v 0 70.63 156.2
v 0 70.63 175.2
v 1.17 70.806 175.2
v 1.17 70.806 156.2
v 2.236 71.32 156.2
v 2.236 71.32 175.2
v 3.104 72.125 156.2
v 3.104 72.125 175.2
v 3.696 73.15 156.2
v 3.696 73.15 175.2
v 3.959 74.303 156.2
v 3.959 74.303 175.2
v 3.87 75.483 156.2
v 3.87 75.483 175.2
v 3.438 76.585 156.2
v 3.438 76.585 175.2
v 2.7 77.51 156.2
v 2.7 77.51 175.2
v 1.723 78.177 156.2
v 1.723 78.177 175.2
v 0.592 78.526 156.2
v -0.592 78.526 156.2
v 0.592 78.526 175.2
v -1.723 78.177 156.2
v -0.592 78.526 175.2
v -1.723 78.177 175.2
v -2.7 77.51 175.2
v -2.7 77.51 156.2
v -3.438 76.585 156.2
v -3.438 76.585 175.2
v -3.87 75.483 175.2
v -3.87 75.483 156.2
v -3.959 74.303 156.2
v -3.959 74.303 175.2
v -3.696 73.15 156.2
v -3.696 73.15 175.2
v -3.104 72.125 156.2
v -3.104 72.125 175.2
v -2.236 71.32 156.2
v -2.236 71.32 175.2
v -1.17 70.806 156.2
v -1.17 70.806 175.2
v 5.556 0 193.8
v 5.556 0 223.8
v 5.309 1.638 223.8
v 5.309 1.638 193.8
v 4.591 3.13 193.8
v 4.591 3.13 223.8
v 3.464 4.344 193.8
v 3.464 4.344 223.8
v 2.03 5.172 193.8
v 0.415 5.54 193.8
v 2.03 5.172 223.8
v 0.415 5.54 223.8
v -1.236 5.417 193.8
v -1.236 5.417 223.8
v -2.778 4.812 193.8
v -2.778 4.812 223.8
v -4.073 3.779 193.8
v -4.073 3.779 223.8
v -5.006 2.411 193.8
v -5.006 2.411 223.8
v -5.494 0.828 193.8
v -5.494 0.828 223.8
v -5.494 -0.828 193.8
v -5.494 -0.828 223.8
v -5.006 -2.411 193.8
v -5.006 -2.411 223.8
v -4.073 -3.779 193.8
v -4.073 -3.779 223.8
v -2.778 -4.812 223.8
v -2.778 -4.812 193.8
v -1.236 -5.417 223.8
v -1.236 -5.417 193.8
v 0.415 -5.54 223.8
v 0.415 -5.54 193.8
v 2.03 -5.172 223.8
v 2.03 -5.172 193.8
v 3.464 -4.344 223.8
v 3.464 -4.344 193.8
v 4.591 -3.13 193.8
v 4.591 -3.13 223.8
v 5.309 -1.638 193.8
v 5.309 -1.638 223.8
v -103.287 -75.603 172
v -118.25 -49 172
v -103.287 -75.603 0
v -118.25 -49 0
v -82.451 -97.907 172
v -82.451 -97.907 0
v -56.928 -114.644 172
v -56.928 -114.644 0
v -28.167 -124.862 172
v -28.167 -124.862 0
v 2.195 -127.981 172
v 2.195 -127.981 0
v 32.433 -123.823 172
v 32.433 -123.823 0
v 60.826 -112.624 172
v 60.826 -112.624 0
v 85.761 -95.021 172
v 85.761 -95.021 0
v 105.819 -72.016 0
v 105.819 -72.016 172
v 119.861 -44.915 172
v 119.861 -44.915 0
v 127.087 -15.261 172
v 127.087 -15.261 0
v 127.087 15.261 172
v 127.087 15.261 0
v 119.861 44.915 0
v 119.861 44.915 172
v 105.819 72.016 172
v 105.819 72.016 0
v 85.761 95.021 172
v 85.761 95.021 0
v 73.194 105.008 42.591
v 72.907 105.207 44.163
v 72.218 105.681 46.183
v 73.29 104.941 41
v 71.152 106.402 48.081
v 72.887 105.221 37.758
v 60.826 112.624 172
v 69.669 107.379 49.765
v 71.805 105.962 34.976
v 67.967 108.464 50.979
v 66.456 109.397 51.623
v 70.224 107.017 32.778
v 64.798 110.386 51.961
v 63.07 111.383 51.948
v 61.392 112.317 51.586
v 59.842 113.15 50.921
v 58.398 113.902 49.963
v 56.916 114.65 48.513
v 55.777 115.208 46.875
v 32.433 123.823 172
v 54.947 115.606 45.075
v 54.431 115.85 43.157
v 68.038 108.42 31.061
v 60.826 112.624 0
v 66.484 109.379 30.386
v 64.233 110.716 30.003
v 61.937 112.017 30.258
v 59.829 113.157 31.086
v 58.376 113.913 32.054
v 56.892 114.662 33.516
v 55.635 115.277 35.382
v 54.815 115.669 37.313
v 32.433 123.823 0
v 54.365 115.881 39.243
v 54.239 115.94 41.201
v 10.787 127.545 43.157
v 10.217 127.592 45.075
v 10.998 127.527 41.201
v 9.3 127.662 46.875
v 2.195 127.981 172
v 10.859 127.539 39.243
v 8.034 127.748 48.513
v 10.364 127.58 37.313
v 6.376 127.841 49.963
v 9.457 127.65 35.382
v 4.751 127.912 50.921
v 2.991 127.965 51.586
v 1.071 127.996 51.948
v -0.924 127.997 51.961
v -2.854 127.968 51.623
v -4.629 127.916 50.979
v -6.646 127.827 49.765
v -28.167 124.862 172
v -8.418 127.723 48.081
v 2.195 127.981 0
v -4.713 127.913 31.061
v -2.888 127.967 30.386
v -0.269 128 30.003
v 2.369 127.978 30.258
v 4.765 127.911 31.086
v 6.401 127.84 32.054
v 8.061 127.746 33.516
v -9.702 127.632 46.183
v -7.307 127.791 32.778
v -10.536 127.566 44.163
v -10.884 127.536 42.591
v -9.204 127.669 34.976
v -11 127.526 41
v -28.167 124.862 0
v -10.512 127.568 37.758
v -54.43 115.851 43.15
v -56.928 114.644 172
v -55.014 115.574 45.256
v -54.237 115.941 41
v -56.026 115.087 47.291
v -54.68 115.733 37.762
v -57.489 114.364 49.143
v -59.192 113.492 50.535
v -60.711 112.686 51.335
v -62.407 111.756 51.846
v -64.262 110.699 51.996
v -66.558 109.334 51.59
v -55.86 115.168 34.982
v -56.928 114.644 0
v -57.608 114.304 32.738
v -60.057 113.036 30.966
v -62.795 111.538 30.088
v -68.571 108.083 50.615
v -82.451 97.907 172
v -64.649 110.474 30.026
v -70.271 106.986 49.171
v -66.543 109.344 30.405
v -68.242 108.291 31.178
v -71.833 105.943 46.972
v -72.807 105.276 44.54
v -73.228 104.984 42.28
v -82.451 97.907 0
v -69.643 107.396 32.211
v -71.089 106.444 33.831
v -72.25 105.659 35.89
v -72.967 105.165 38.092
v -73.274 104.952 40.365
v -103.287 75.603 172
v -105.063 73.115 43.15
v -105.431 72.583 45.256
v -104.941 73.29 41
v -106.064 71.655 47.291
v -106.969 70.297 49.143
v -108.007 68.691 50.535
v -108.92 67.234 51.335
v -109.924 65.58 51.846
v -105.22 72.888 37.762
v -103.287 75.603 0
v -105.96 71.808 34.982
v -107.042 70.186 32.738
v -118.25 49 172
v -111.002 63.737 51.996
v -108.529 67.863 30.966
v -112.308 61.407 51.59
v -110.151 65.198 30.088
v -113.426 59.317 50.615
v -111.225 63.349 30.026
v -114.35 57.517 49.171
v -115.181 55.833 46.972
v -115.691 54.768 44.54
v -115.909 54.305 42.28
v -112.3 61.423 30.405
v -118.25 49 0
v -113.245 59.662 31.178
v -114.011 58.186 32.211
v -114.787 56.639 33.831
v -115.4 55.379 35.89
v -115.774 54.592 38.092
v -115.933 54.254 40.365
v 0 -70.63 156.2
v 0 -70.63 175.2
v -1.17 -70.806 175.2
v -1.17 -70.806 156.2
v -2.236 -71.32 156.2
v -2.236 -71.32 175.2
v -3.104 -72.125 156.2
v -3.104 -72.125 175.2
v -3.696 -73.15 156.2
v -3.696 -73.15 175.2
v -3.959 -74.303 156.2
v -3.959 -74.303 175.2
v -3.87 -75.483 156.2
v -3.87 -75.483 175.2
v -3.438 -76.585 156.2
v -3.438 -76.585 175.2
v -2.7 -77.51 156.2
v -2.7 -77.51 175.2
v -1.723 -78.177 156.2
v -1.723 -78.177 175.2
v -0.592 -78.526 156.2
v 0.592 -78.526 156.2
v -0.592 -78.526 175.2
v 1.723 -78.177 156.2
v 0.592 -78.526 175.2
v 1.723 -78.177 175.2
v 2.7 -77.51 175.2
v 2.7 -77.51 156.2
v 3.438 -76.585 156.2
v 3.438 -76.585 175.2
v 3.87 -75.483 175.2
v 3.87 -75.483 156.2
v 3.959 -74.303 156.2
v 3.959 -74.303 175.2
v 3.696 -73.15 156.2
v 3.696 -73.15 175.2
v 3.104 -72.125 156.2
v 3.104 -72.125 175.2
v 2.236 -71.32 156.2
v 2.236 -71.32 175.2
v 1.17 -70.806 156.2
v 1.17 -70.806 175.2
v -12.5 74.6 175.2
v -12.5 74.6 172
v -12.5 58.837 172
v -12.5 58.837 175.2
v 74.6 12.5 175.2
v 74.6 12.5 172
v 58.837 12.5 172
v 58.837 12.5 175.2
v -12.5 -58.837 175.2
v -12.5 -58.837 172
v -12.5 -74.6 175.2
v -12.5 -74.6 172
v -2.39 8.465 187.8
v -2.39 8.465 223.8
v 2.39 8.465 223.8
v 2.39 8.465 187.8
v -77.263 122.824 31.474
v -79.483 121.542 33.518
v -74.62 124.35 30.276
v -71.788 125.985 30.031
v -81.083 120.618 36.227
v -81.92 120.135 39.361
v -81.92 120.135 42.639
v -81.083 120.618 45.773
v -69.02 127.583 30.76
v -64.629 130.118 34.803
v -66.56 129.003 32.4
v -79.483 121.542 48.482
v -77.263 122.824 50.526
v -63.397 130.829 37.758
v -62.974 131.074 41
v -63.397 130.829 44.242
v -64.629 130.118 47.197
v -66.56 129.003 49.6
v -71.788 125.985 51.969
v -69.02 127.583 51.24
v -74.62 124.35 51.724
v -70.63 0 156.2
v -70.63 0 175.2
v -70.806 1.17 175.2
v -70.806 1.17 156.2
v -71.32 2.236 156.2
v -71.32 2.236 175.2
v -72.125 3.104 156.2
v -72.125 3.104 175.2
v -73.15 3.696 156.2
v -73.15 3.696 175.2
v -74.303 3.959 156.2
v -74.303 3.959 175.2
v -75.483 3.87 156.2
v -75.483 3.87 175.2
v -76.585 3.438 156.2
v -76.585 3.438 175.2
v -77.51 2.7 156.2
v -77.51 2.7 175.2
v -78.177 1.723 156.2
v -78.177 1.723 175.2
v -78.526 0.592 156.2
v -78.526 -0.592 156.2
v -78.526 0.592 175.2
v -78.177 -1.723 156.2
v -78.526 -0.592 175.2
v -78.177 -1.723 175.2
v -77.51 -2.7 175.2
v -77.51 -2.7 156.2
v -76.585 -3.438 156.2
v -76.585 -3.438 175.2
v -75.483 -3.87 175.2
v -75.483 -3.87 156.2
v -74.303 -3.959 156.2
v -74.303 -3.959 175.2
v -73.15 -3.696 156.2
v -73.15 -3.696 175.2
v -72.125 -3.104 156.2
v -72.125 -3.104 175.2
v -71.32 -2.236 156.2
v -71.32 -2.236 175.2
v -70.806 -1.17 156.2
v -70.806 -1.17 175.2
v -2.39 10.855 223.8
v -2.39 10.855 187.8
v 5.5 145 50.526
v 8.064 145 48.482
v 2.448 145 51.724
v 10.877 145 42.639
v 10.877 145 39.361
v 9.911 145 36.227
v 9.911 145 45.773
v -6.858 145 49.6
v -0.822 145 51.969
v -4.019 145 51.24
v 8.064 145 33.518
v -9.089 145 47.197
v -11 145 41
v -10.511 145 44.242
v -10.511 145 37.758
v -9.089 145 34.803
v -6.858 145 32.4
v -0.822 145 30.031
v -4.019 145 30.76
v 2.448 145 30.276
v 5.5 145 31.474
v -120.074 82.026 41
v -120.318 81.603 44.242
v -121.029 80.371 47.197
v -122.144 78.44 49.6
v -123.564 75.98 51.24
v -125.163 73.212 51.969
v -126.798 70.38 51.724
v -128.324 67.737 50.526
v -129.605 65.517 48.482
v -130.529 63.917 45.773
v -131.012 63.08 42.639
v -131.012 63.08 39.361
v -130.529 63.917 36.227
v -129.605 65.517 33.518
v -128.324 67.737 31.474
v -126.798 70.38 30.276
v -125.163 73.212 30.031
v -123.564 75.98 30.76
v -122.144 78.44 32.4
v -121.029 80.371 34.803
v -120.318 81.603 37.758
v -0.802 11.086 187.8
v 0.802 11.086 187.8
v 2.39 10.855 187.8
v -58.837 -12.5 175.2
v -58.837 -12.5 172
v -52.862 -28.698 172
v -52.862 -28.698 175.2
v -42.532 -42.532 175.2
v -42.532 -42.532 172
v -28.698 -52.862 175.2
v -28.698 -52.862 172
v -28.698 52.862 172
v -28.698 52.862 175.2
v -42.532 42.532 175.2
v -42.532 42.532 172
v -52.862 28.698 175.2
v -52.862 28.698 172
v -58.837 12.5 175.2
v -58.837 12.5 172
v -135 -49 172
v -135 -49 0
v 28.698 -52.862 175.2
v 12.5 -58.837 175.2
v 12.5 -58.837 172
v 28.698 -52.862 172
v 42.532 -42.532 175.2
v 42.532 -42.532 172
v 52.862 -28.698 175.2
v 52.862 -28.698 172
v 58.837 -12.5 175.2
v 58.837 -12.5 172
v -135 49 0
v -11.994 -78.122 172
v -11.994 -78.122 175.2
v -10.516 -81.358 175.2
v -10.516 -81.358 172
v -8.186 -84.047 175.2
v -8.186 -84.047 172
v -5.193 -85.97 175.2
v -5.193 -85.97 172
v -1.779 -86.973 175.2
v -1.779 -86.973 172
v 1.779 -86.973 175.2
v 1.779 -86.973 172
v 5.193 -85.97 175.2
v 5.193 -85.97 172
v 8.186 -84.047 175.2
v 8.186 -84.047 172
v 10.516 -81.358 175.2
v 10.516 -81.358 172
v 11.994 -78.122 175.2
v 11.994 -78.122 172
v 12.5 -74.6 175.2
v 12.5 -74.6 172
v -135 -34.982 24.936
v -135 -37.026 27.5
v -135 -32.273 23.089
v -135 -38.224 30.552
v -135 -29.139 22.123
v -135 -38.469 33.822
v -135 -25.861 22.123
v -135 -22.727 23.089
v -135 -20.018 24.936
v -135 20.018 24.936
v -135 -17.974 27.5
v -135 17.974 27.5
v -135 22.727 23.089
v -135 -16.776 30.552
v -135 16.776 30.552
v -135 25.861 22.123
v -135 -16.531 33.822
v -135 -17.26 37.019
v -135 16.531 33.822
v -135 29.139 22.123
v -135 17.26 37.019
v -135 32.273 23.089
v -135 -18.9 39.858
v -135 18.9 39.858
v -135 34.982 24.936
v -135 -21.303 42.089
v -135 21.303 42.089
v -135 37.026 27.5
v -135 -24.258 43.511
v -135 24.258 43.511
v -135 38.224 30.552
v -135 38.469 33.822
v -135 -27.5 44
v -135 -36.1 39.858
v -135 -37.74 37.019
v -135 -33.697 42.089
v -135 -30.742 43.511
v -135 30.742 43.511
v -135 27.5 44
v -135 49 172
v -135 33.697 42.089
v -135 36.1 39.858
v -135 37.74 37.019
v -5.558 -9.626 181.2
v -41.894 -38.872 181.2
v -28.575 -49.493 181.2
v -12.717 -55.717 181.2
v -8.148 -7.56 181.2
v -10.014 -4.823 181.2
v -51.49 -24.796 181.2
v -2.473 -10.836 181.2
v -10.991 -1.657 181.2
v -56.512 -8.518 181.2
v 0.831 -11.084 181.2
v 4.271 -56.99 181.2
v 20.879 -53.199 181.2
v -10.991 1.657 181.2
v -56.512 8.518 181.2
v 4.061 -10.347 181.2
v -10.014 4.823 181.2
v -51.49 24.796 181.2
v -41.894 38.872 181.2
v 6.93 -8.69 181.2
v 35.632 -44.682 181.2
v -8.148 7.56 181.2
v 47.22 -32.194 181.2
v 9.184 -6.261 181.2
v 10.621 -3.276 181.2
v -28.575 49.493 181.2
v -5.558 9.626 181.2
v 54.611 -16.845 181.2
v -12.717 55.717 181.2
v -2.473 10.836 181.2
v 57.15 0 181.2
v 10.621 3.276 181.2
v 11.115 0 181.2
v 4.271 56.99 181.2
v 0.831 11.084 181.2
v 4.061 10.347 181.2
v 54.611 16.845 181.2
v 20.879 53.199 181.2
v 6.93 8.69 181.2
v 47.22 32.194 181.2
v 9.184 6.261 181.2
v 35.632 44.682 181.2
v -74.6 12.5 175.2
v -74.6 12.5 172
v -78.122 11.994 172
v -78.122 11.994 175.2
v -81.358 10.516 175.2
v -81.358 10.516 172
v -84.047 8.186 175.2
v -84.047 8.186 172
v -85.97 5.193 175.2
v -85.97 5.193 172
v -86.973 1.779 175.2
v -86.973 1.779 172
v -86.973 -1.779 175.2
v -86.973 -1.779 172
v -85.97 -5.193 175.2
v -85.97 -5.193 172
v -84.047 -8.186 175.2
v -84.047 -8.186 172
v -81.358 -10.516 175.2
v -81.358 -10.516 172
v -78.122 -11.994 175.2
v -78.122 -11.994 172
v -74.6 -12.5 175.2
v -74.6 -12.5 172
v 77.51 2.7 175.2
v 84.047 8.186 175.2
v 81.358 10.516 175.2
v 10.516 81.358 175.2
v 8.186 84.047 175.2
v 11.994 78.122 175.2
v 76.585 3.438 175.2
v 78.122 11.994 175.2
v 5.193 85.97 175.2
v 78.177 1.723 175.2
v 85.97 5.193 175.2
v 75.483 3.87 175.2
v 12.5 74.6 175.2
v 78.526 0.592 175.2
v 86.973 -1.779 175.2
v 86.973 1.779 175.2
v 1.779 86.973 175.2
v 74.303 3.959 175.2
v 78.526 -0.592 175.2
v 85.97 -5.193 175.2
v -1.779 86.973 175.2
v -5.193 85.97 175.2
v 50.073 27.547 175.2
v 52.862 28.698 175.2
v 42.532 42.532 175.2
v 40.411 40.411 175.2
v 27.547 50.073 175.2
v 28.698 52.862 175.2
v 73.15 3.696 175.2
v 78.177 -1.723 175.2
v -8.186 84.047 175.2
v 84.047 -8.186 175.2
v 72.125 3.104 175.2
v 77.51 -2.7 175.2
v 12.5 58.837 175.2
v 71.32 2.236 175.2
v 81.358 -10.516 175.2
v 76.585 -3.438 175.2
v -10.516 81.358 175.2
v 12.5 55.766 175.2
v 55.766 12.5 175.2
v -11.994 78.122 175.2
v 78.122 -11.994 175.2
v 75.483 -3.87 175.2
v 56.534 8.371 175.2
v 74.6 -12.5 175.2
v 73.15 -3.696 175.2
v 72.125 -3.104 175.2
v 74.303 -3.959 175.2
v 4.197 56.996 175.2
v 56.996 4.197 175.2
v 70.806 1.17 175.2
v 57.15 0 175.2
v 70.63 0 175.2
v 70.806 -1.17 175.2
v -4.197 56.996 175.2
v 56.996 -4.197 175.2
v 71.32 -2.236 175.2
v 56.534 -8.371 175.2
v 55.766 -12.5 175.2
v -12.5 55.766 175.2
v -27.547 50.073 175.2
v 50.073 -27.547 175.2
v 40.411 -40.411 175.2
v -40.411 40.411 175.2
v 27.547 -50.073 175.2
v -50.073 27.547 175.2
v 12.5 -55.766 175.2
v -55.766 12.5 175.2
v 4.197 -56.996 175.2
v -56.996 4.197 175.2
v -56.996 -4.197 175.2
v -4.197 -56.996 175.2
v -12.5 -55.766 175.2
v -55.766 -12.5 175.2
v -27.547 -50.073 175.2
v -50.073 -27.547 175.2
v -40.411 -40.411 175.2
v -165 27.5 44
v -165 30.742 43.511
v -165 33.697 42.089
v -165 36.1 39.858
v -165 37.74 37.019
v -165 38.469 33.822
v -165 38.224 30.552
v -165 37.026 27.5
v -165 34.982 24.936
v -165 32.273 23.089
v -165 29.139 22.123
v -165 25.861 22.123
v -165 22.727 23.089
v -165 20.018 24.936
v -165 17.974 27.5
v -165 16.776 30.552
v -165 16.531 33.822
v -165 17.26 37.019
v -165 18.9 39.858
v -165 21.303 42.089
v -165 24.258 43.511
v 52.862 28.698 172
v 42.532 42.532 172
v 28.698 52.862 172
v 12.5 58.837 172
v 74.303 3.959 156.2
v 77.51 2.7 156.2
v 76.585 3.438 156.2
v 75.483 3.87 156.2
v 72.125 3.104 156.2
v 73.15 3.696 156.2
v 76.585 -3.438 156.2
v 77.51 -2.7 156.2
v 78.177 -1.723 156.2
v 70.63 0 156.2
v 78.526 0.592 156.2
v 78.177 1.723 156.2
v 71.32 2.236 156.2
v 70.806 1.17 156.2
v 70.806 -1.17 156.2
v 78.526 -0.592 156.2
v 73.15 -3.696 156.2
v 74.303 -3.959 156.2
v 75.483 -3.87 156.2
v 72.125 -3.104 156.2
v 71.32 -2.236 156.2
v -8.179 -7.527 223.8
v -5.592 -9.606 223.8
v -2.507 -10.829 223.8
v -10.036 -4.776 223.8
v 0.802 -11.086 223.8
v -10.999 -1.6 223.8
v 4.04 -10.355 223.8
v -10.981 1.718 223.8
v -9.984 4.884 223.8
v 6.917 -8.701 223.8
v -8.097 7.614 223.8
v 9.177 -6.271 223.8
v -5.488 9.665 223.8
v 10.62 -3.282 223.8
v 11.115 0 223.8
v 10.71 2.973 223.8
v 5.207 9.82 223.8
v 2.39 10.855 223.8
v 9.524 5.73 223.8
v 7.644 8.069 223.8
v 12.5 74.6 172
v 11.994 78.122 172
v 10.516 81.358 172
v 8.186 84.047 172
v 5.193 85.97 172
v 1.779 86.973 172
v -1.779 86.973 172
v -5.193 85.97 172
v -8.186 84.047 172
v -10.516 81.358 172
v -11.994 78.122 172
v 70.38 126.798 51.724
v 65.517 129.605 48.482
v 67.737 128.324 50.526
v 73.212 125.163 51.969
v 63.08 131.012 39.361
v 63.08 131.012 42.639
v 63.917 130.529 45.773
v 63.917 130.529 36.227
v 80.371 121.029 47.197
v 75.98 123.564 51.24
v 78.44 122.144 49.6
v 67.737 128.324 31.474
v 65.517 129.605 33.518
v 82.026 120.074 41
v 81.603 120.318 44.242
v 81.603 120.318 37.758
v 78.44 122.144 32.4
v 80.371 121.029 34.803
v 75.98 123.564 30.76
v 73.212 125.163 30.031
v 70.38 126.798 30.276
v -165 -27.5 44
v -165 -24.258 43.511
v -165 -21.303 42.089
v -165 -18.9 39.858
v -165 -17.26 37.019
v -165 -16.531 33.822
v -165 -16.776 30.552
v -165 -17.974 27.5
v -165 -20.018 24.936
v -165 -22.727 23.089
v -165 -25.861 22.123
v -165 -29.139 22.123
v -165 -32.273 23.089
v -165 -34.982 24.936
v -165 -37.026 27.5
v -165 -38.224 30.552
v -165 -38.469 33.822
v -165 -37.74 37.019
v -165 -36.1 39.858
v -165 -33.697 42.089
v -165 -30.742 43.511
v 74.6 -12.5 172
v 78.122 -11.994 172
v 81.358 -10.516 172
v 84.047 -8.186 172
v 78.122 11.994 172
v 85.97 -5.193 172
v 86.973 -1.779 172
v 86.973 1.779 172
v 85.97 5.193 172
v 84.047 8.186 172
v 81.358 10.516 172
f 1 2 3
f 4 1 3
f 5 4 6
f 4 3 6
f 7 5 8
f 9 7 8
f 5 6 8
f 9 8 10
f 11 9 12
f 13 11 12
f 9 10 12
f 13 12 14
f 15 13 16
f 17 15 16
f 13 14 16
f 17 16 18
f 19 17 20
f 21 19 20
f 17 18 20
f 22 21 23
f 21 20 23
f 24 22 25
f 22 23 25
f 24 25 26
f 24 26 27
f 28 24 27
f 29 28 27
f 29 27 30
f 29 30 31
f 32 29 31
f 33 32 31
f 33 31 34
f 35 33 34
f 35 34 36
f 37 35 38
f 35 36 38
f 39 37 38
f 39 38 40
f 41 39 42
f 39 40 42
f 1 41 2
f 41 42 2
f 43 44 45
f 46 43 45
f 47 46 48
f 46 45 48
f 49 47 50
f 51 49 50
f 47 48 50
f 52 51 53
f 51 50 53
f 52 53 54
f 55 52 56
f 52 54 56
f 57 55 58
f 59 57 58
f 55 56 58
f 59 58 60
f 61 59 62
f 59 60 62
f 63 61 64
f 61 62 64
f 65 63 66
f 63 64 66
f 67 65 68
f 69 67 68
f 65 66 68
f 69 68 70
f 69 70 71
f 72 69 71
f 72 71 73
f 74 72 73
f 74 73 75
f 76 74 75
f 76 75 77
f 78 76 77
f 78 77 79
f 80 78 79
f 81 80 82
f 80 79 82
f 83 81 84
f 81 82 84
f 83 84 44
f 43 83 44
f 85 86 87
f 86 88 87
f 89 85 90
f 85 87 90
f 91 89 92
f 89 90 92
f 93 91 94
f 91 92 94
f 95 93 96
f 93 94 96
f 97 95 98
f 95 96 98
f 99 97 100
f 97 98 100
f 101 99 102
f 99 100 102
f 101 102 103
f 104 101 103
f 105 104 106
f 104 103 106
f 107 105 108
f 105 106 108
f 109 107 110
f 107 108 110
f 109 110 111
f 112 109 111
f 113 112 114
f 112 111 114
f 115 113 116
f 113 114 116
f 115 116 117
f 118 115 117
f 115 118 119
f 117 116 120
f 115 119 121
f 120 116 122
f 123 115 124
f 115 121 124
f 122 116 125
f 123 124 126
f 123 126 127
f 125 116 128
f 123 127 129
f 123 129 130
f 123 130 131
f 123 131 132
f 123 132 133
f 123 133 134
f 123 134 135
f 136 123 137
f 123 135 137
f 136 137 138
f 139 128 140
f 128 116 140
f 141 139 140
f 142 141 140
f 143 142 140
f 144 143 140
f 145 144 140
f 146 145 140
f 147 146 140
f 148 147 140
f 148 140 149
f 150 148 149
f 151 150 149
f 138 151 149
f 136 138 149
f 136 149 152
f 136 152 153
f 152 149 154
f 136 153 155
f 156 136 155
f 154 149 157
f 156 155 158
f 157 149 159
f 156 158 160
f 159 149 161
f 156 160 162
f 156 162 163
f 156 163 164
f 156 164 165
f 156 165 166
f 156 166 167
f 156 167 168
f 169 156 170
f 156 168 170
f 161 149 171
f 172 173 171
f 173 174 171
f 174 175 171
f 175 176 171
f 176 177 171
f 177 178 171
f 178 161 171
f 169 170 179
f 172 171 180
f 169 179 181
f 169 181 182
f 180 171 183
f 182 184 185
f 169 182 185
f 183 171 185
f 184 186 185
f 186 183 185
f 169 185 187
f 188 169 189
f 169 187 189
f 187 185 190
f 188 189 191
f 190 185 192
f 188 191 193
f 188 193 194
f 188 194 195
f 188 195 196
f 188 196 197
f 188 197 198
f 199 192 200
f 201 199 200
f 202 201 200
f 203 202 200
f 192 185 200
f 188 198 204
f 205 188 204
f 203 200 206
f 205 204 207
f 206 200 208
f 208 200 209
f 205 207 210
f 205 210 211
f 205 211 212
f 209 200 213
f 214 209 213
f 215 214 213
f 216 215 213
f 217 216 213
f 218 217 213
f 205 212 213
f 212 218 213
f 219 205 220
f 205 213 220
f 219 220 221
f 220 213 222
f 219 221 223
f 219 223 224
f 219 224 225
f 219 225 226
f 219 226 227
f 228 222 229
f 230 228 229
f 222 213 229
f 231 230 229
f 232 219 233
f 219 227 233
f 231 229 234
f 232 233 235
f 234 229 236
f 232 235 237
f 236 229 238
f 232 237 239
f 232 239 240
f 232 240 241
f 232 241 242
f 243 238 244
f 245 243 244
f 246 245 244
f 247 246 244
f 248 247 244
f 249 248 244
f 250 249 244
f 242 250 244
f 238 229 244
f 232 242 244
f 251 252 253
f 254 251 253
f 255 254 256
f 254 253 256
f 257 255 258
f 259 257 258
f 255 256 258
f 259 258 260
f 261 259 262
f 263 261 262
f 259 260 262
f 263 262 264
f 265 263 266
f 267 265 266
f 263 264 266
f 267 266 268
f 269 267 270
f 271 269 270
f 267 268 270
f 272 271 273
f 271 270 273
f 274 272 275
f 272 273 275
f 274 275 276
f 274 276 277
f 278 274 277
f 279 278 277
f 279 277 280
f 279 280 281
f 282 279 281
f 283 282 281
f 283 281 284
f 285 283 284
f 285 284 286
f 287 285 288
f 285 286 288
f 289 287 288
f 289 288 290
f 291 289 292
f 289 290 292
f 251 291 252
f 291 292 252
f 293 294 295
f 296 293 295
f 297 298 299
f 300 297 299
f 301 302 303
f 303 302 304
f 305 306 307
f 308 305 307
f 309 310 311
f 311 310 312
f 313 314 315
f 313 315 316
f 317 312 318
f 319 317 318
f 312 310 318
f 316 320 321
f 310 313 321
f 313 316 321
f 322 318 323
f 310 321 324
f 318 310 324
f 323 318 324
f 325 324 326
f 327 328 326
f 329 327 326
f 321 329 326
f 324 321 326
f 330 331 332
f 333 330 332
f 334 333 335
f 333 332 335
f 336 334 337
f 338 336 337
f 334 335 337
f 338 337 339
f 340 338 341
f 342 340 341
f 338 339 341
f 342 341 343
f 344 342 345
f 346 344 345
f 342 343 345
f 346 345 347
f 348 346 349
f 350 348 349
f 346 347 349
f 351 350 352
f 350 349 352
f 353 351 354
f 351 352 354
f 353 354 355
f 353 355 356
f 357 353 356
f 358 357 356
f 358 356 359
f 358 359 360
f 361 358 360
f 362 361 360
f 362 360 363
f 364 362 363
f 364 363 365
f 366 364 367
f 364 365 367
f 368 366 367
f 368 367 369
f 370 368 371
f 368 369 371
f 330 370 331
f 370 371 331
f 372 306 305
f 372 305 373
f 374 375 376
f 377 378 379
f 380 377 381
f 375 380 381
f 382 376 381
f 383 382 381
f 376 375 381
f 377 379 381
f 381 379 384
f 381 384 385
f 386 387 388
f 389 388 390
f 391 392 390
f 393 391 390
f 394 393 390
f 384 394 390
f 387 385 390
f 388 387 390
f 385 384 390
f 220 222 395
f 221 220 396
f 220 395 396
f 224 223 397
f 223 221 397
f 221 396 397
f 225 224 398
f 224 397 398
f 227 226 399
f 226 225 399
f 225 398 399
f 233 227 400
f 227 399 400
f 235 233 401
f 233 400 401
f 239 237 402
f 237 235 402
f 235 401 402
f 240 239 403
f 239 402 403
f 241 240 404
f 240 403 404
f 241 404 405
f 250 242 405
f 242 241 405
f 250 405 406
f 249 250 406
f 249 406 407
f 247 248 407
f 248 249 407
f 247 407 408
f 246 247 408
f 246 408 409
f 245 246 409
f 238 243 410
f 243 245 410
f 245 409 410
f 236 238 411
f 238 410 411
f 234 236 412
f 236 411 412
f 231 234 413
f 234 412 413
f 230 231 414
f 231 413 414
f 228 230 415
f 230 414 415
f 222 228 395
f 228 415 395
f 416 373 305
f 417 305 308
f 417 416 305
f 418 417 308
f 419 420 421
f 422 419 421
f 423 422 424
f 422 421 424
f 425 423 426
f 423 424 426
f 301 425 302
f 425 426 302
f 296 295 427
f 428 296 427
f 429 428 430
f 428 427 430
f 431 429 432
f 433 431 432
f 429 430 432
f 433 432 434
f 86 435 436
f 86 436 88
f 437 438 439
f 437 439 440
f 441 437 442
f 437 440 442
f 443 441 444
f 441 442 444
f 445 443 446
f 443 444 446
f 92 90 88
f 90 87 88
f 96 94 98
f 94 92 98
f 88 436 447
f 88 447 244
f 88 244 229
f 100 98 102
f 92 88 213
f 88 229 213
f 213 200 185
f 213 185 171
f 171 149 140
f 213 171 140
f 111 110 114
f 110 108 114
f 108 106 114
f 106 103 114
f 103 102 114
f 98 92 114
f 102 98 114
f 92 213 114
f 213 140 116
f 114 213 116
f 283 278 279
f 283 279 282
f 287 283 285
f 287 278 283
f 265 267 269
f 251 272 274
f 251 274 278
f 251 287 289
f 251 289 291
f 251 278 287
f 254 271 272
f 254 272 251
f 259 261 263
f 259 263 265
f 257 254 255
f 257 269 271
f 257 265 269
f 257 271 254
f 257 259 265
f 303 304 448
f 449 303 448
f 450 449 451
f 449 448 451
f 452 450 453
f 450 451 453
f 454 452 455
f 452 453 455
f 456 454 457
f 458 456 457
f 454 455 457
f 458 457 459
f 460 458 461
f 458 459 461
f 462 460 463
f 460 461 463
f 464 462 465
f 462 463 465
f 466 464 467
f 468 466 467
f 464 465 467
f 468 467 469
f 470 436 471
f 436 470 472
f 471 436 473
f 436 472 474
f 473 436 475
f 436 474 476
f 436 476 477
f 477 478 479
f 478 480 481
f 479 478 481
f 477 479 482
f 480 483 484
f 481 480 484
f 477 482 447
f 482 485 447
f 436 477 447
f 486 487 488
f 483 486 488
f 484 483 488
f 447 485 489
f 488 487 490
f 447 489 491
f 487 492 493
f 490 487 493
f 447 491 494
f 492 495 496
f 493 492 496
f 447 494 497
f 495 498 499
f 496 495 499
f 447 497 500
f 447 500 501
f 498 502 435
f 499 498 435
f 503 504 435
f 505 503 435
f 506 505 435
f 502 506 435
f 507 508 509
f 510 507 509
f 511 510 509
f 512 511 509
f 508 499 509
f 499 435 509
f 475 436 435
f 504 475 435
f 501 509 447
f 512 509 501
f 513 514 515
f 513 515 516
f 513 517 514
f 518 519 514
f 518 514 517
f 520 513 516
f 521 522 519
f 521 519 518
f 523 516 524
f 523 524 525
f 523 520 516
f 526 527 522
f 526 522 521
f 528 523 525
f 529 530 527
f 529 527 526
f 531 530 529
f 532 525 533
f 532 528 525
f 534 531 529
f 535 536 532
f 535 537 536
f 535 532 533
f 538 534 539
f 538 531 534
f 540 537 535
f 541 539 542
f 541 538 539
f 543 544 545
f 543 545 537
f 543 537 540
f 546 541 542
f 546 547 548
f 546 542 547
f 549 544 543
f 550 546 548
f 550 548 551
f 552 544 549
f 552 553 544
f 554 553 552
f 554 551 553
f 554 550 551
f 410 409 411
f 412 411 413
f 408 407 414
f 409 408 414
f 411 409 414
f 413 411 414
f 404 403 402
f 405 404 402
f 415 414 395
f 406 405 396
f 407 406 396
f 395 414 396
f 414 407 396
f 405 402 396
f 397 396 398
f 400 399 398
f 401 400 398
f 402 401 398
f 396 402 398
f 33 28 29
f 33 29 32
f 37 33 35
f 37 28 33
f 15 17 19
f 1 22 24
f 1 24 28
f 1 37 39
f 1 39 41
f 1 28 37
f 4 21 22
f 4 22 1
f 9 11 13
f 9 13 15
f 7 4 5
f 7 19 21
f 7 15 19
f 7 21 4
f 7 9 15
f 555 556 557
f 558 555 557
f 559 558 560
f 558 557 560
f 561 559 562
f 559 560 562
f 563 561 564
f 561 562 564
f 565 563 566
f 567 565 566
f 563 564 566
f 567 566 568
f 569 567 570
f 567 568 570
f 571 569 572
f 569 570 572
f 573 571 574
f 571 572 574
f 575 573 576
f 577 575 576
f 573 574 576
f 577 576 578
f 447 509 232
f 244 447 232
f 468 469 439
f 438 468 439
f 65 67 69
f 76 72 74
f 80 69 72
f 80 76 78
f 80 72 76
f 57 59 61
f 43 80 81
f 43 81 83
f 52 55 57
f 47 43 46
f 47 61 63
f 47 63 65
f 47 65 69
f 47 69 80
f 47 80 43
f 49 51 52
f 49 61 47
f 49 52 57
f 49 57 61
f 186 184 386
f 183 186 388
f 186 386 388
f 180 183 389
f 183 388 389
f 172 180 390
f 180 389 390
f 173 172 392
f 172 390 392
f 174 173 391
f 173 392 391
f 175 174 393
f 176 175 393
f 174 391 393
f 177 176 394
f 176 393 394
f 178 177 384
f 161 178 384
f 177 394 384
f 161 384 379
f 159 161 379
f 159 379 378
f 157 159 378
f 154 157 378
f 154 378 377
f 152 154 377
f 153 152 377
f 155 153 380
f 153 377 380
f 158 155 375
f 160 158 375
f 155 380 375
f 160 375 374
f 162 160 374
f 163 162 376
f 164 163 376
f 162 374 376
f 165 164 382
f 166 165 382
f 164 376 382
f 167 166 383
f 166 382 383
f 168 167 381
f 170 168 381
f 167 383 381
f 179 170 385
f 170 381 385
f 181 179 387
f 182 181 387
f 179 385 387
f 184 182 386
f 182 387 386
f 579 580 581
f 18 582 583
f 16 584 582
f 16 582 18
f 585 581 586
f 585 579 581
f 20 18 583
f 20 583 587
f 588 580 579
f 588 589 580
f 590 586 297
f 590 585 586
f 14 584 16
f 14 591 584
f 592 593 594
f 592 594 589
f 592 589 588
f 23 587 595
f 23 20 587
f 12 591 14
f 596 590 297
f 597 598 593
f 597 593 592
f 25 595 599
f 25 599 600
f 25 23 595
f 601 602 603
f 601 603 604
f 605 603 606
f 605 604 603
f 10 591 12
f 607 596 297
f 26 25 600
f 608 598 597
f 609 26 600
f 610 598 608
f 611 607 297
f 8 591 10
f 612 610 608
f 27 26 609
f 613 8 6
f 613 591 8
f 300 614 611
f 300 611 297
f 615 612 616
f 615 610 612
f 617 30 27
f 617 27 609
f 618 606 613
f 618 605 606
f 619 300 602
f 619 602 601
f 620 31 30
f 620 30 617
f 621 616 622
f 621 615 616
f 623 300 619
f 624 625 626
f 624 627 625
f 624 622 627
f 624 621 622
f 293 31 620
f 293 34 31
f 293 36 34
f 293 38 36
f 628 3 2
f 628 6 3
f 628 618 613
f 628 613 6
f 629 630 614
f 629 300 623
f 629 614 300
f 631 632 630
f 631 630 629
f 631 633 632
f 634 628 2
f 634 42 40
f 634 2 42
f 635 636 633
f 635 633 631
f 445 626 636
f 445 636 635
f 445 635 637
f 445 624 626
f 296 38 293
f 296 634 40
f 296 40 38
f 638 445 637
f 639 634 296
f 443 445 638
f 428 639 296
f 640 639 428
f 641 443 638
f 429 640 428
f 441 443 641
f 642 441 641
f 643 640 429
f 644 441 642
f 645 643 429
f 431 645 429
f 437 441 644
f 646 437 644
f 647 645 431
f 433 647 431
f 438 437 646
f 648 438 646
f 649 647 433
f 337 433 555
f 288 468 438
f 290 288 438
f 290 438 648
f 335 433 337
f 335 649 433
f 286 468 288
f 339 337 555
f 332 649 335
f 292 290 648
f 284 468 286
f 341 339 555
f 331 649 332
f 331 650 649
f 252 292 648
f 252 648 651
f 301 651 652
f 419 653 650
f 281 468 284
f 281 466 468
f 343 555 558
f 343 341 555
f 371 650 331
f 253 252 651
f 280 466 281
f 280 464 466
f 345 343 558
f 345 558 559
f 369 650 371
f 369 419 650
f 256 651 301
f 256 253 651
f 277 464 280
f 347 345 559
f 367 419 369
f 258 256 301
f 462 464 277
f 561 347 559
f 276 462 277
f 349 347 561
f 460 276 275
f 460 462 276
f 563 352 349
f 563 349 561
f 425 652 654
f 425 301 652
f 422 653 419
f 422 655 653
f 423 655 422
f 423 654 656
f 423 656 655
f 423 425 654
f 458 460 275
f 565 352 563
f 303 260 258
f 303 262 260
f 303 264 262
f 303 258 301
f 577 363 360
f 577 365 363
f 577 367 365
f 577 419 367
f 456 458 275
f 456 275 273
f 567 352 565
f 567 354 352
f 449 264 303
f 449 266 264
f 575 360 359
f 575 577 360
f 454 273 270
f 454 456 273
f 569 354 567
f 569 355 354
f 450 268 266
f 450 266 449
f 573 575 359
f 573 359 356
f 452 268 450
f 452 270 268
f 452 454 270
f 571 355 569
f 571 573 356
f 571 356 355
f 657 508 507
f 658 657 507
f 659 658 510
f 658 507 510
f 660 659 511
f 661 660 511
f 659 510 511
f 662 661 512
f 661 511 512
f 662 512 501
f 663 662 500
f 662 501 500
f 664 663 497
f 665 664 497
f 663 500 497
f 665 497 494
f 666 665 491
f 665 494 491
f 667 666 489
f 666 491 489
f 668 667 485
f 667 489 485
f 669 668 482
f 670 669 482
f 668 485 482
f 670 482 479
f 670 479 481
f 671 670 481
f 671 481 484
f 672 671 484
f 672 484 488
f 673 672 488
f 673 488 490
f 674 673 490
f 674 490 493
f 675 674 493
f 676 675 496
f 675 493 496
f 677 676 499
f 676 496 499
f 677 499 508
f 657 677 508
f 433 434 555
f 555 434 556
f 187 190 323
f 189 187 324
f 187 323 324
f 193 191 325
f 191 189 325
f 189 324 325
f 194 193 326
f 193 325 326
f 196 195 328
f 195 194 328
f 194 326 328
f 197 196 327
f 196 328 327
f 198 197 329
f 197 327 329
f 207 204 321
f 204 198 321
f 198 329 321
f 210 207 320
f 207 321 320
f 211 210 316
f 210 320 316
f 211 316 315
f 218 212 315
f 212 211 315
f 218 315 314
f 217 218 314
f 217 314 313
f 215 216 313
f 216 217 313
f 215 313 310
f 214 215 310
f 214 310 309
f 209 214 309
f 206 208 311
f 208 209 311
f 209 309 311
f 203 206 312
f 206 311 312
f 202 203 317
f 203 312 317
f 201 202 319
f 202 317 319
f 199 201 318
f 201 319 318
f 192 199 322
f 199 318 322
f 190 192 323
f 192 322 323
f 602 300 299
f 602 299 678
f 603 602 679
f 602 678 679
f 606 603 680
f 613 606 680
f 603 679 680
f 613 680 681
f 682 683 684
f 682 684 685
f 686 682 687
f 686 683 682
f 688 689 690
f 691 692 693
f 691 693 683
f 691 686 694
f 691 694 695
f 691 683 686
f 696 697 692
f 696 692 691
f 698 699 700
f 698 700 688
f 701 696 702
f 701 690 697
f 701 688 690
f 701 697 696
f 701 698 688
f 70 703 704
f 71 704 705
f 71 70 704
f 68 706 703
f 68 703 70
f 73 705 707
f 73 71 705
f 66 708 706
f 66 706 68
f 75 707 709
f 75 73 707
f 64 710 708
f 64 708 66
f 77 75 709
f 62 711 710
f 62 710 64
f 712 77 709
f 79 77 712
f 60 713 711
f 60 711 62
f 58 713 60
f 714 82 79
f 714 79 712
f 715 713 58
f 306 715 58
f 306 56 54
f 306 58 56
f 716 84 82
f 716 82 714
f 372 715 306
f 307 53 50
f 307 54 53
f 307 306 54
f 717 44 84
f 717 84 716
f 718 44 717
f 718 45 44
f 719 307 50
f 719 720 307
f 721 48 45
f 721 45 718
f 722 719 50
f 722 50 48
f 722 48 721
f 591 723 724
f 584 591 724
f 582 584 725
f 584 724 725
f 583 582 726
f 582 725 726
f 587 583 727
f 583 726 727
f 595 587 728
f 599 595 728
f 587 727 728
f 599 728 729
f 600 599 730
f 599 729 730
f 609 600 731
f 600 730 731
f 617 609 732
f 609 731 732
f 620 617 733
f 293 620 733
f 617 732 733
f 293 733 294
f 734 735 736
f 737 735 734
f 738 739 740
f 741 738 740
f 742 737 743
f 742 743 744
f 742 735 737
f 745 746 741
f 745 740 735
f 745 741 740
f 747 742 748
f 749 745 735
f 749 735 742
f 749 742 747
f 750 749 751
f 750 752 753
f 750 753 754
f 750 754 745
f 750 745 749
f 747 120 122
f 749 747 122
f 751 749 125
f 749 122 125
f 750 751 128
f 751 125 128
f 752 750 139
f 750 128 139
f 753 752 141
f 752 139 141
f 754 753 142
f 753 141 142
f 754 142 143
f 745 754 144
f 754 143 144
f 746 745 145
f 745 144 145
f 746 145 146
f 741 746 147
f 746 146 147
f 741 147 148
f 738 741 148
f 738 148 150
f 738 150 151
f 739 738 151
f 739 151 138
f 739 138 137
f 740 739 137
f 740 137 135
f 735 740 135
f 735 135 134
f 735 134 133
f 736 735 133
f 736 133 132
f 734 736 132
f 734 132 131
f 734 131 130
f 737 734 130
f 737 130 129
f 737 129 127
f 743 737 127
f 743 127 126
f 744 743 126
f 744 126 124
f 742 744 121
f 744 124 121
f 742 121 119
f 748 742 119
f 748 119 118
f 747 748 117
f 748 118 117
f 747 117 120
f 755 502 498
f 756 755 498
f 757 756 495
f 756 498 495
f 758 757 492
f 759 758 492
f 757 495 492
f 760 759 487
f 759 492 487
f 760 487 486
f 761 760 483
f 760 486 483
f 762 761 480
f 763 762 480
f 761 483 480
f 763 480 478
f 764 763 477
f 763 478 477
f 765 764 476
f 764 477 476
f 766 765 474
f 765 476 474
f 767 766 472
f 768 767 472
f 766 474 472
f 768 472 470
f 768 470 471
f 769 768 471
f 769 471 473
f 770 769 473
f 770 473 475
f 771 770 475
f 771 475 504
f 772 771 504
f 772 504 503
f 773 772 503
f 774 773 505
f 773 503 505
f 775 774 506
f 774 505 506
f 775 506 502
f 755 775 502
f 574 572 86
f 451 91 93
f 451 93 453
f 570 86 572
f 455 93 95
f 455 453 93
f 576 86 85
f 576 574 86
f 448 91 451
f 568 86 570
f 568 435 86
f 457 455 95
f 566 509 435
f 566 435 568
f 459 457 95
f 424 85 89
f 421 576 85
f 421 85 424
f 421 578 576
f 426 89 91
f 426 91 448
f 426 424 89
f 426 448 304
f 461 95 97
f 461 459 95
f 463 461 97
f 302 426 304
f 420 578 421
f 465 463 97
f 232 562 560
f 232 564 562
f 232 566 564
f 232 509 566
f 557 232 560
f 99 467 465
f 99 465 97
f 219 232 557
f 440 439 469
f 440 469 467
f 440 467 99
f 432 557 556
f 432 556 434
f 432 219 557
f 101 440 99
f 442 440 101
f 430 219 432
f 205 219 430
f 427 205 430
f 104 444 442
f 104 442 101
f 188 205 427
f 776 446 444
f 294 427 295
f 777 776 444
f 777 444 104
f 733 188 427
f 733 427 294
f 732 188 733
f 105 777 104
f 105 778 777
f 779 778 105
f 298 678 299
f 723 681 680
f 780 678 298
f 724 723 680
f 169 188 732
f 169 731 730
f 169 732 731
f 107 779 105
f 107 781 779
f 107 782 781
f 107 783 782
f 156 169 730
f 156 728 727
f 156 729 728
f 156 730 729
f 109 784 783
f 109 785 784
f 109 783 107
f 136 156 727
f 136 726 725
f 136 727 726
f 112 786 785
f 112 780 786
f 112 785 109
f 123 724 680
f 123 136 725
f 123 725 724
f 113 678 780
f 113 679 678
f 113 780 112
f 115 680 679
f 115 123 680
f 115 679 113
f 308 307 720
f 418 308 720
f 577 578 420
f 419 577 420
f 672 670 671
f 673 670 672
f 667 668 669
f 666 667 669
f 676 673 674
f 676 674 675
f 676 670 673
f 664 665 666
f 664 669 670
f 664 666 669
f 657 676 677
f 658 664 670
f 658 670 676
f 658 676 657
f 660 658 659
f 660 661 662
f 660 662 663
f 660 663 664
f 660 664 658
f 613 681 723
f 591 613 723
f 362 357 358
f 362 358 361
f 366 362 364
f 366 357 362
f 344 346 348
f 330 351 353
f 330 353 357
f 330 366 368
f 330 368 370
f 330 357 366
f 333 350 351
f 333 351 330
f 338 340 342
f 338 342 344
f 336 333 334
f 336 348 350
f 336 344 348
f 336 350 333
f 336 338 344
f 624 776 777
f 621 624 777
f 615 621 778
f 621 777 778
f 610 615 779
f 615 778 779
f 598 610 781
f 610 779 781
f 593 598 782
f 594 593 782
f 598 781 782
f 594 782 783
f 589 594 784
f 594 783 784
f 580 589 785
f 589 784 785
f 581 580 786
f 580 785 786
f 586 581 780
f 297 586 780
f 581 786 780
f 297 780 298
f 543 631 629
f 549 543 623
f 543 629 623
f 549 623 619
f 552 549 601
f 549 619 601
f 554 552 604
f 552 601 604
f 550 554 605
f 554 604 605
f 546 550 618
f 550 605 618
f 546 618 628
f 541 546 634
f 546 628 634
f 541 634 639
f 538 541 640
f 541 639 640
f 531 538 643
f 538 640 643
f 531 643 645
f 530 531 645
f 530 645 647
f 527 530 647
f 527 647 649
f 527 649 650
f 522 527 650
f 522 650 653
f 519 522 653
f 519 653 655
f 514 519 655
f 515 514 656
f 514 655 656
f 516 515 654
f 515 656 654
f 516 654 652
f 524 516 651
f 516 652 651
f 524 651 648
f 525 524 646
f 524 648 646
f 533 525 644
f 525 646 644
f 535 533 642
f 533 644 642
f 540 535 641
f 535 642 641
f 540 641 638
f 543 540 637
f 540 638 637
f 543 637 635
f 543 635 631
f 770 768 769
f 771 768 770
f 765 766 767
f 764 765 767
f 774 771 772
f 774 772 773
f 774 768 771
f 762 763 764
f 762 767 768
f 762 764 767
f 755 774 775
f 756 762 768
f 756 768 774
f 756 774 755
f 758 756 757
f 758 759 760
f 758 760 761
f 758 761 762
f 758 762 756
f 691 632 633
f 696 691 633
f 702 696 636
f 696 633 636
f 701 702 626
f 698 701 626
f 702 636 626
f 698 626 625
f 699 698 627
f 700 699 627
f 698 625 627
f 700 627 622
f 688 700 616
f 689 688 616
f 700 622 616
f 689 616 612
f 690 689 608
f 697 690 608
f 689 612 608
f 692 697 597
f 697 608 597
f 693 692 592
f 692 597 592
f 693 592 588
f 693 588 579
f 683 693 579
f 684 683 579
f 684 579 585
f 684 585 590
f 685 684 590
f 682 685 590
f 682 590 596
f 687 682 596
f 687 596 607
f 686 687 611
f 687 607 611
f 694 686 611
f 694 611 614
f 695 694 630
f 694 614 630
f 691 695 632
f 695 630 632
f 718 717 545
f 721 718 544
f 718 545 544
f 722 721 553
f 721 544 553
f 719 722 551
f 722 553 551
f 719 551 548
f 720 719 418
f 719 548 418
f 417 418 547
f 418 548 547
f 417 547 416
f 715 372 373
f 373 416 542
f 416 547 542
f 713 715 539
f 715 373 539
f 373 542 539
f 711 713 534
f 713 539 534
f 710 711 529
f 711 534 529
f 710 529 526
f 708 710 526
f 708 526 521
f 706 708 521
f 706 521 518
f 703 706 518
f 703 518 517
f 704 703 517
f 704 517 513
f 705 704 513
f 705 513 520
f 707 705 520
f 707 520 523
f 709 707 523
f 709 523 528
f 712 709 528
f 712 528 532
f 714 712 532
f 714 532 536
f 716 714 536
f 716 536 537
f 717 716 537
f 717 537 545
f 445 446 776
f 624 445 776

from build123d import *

# Parameters (mm, degrees)
SZKIC1_R                    = 128
DODANIE_WYCI_GNI_CIE1_DEPTH = 172
SZKIC2_W                    = 135
SZKIC2_H                    = 98
DODANIE_WYCI_GNI_CIE2_DEPTH = 172
SZKIC3_R                    = 11
DODANIE_WYCI_GNI_CIE3_DEPTH = 30
SZKIC5_W                    = 11
SZKIC5_H                    = 25
SZYK_START                  = -145
SZYK_KO_OWY1_OUTLINE_R      = 11
SZYK_KO_OWY1_DEPTH          = 17.473532259
SZYK_KO_OWY1_2_OUTLINE_R    = 11
SZYK_KO_OWY1_2_DEPTH        = 17.473532259
SZYK_START_2                = 127.526467741
SZYK_KO_OWY1_3_OUTLINE_R    = 11
SZYK_KO_OWY1_3_DEPTH        = 17.473532259
SZKIC6_R                    = 57.15
DODANIE_WYCI_GNI_CIE4_DEPTH = 9.2
SZKIC7_R                    = 11.115
DODANIE_WYCI_GNI_CIE5_DEPTH = 42.6
SZKIC8_W                    = 4.78
SZKIC8_H                    = 5
WYTNIJ_WYCI_GNI_CIE1_DEPTH  = 36
SZKIC9_R                    = 5.556
WYTNIJ_WYCI_GNI_CIE2_DEPTH  = 30
DODANIE_WYCI_GNI_CIE6_DEPTH = 3.2
SZKIC11_R                   = 3.97
WYTNIJ_WYCI_GNI_CIE3_DEPTH  = 19
SZYK_KO_OWY2_COUNT          = 4
SZKIC12_R                   = 60.15
DODANIE_WYCI_GNI_CIE7_DEPTH = 3.2


# Read off the part's stored shape, not the designer's step: Szyk kołowy1
with BuildPart() as part:
    # Szkic1 → Dodanie-wyciągnięcie1 (new body)
    with BuildSketch(Plane.XY):
        Circle(SZKIC1_R)
    extrude(amount=DODANIE_WYCI_GNI_CIE1_DEPTH)

    # Szkic2 → Dodanie-wyciągnięcie2 (add)
    with BuildSketch(Plane.XY.offset(172)):
        with Locations((-67.5, 0)):
            Rectangle(SZKIC2_W, SZKIC2_H)
    extrude(amount=-DODANIE_WYCI_GNI_CIE2_DEPTH)

    # Szkic3 → Dodanie-wyciągnięcie3 (add)
    with BuildSketch(Plane.ZY.offset(135)):
        with Locations((33, 27.5)):
            Circle(SZKIC3_R)
        with Locations((33, -27.5)):
            Circle(SZKIC3_R)
    extrude(amount=DODANIE_WYCI_GNI_CIE3_DEPTH)

    # Szkic5 → Obrót1 (revolve)
    with BuildSketch(Plane(origin=(0, 0, 41), x_dir=(-1, 0, 0), z_dir=(0, 0, -1)), mode=Mode.PRIVATE) as obr_t1_sk:
        with Locations((-5.5, 132.5)):
            Rectangle(SZKIC5_W, SZKIC5_H)
    revolve(obr_t1_sk.sketch.rotate(Axis((0, 145, 41), (0, -1, 0)), 180), axis=Axis((0, 145, 41), (0, -1, 0)))

    # Szyk kołowy1 outline → Szyk kołowy1 (add)
    with BuildSketch(Plane(origin=(0, 0, 0), x_dir=(0.866025403784438, 0.500000000000001, 0), z_dir=(0.500000000000001, -0.866025403784438, 0)).offset(SZYK_START)):
        with Locations((0, 41)):
            Circle(SZYK_KO_OWY1_OUTLINE_R)
    extrude(amount=SZYK_KO_OWY1_DEPTH)

    # Szyk ko_owy1 2 outline → Szyk ko_owy1 2 (add)
    with BuildSketch(Plane(origin=(0, 0, 0), x_dir=(0.49999999999999767, 0.86602540378444, 0), z_dir=(0.8660254037844399, -0.49999999999999795, 0)).offset(SZYK_START)):
        with Locations((0, 41)):
            Circle(SZYK_KO_OWY1_2_OUTLINE_R)
    extrude(amount=SZYK_KO_OWY1_2_DEPTH)

    # Szyk ko_owy1 3 outline → Szyk ko_owy1 3 (add)
    with BuildSketch(Plane(origin=(0, 0, 0), x_dir=(0.866025403784438, -0.500000000000001, 0), z_dir=(0.500000000000001, 0.866025403784438, 0)).offset(SZYK_START_2)):
        with Locations((0, -41)):
            Circle(SZYK_KO_OWY1_3_OUTLINE_R)
    extrude(amount=SZYK_KO_OWY1_3_DEPTH)

    # Szkic6 → Dodanie-wyciągnięcie4 (add)
    with BuildSketch(Plane.XY.offset(172)):
        Circle(SZKIC6_R)
    extrude(amount=DODANIE_WYCI_GNI_CIE4_DEPTH)

    # Szkic7 → Dodanie-wyciągnięcie5 (add)
    with BuildSketch(Plane.XY.offset(181.2)):
        Circle(SZKIC7_R)
    extrude(amount=DODANIE_WYCI_GNI_CIE5_DEPTH)

    # Szkic8 → Wytnij-wyciągnięcie1 (cut)
    with BuildSketch(Plane.XY.offset(223.8)):
        with Locations((0, 10.965)):
            Rectangle(SZKIC8_W, SZKIC8_H)
    extrude(amount=-WYTNIJ_WYCI_GNI_CIE1_DEPTH, mode=Mode.SUBTRACT)

    # Szkic9 → Wytnij-wyciągnięcie2 (cut)
    with BuildSketch(Plane.XY.offset(223.8)):
        Circle(SZKIC9_R)
    extrude(amount=-WYTNIJ_WYCI_GNI_CIE2_DEPTH, mode=Mode.SUBTRACT)

    # Szkic10 → Dodanie-wyciągnięcie6 (add)
    with BuildSketch(Plane.XY.offset(172)):
        with BuildLine():
            Line((-73.545292167, 12.5), (-74.6, 12.5))
            ThreePointArc((-74.6, 12.5), (-87.1, 0), (-74.6, -12.5))
            Line((-74.6, -12.5), (-73.545292167, -12.5))
            Line((-73.545292167, -12.5), (-55.766230821, -12.5))
            ThreePointArc((-55.766230821, -12.5), (-57.15, 0), (-55.766230821, 12.5))
            Line((-55.766230821, 12.5), (-73.545292167, 12.5))
        make_face()
    dodanie_wyci_gni_cie6 = extrude(amount=DODANIE_WYCI_GNI_CIE6_DEPTH)

    # Szkic11 → Wytnij-wyciągnięcie3 (cut)
    with BuildSketch(Plane.XY.offset(175.2)):
        with Locations((-74.6, 0)):
            Circle(SZKIC11_R)
    wytnij_wyci_gni_cie3 = extrude(amount=-WYTNIJ_WYCI_GNI_CIE3_DEPTH, mode=Mode.SUBTRACT)

    # Szyk kołowy2: Dodanie-wyciągnięcie6, Wytnij-wyciągnięcie3 ×4 about axis
    szyk_ko_owy2_axis = Axis((0, 0, 0), (0, 0, 1))
    add([dodanie_wyci_gni_cie6.rotate(szyk_ko_owy2_axis, i * 360 / SZYK_KO_OWY2_COUNT) for i in range(1, SZYK_KO_OWY2_COUNT)])
    add([wytnij_wyci_gni_cie3.rotate(szyk_ko_owy2_axis, i * 360 / SZYK_KO_OWY2_COUNT) for i in range(1, SZYK_KO_OWY2_COUNT)], mode=Mode.SUBTRACT)

    # Szkic12 → Dodanie-wyciągnięcie7 (add)
    with BuildSketch(Plane.XY.offset(172)):
        Circle(SZKIC12_R)
    extrude(amount=DODANIE_WYCI_GNI_CIE7_DEPTH)


solid = part.part
